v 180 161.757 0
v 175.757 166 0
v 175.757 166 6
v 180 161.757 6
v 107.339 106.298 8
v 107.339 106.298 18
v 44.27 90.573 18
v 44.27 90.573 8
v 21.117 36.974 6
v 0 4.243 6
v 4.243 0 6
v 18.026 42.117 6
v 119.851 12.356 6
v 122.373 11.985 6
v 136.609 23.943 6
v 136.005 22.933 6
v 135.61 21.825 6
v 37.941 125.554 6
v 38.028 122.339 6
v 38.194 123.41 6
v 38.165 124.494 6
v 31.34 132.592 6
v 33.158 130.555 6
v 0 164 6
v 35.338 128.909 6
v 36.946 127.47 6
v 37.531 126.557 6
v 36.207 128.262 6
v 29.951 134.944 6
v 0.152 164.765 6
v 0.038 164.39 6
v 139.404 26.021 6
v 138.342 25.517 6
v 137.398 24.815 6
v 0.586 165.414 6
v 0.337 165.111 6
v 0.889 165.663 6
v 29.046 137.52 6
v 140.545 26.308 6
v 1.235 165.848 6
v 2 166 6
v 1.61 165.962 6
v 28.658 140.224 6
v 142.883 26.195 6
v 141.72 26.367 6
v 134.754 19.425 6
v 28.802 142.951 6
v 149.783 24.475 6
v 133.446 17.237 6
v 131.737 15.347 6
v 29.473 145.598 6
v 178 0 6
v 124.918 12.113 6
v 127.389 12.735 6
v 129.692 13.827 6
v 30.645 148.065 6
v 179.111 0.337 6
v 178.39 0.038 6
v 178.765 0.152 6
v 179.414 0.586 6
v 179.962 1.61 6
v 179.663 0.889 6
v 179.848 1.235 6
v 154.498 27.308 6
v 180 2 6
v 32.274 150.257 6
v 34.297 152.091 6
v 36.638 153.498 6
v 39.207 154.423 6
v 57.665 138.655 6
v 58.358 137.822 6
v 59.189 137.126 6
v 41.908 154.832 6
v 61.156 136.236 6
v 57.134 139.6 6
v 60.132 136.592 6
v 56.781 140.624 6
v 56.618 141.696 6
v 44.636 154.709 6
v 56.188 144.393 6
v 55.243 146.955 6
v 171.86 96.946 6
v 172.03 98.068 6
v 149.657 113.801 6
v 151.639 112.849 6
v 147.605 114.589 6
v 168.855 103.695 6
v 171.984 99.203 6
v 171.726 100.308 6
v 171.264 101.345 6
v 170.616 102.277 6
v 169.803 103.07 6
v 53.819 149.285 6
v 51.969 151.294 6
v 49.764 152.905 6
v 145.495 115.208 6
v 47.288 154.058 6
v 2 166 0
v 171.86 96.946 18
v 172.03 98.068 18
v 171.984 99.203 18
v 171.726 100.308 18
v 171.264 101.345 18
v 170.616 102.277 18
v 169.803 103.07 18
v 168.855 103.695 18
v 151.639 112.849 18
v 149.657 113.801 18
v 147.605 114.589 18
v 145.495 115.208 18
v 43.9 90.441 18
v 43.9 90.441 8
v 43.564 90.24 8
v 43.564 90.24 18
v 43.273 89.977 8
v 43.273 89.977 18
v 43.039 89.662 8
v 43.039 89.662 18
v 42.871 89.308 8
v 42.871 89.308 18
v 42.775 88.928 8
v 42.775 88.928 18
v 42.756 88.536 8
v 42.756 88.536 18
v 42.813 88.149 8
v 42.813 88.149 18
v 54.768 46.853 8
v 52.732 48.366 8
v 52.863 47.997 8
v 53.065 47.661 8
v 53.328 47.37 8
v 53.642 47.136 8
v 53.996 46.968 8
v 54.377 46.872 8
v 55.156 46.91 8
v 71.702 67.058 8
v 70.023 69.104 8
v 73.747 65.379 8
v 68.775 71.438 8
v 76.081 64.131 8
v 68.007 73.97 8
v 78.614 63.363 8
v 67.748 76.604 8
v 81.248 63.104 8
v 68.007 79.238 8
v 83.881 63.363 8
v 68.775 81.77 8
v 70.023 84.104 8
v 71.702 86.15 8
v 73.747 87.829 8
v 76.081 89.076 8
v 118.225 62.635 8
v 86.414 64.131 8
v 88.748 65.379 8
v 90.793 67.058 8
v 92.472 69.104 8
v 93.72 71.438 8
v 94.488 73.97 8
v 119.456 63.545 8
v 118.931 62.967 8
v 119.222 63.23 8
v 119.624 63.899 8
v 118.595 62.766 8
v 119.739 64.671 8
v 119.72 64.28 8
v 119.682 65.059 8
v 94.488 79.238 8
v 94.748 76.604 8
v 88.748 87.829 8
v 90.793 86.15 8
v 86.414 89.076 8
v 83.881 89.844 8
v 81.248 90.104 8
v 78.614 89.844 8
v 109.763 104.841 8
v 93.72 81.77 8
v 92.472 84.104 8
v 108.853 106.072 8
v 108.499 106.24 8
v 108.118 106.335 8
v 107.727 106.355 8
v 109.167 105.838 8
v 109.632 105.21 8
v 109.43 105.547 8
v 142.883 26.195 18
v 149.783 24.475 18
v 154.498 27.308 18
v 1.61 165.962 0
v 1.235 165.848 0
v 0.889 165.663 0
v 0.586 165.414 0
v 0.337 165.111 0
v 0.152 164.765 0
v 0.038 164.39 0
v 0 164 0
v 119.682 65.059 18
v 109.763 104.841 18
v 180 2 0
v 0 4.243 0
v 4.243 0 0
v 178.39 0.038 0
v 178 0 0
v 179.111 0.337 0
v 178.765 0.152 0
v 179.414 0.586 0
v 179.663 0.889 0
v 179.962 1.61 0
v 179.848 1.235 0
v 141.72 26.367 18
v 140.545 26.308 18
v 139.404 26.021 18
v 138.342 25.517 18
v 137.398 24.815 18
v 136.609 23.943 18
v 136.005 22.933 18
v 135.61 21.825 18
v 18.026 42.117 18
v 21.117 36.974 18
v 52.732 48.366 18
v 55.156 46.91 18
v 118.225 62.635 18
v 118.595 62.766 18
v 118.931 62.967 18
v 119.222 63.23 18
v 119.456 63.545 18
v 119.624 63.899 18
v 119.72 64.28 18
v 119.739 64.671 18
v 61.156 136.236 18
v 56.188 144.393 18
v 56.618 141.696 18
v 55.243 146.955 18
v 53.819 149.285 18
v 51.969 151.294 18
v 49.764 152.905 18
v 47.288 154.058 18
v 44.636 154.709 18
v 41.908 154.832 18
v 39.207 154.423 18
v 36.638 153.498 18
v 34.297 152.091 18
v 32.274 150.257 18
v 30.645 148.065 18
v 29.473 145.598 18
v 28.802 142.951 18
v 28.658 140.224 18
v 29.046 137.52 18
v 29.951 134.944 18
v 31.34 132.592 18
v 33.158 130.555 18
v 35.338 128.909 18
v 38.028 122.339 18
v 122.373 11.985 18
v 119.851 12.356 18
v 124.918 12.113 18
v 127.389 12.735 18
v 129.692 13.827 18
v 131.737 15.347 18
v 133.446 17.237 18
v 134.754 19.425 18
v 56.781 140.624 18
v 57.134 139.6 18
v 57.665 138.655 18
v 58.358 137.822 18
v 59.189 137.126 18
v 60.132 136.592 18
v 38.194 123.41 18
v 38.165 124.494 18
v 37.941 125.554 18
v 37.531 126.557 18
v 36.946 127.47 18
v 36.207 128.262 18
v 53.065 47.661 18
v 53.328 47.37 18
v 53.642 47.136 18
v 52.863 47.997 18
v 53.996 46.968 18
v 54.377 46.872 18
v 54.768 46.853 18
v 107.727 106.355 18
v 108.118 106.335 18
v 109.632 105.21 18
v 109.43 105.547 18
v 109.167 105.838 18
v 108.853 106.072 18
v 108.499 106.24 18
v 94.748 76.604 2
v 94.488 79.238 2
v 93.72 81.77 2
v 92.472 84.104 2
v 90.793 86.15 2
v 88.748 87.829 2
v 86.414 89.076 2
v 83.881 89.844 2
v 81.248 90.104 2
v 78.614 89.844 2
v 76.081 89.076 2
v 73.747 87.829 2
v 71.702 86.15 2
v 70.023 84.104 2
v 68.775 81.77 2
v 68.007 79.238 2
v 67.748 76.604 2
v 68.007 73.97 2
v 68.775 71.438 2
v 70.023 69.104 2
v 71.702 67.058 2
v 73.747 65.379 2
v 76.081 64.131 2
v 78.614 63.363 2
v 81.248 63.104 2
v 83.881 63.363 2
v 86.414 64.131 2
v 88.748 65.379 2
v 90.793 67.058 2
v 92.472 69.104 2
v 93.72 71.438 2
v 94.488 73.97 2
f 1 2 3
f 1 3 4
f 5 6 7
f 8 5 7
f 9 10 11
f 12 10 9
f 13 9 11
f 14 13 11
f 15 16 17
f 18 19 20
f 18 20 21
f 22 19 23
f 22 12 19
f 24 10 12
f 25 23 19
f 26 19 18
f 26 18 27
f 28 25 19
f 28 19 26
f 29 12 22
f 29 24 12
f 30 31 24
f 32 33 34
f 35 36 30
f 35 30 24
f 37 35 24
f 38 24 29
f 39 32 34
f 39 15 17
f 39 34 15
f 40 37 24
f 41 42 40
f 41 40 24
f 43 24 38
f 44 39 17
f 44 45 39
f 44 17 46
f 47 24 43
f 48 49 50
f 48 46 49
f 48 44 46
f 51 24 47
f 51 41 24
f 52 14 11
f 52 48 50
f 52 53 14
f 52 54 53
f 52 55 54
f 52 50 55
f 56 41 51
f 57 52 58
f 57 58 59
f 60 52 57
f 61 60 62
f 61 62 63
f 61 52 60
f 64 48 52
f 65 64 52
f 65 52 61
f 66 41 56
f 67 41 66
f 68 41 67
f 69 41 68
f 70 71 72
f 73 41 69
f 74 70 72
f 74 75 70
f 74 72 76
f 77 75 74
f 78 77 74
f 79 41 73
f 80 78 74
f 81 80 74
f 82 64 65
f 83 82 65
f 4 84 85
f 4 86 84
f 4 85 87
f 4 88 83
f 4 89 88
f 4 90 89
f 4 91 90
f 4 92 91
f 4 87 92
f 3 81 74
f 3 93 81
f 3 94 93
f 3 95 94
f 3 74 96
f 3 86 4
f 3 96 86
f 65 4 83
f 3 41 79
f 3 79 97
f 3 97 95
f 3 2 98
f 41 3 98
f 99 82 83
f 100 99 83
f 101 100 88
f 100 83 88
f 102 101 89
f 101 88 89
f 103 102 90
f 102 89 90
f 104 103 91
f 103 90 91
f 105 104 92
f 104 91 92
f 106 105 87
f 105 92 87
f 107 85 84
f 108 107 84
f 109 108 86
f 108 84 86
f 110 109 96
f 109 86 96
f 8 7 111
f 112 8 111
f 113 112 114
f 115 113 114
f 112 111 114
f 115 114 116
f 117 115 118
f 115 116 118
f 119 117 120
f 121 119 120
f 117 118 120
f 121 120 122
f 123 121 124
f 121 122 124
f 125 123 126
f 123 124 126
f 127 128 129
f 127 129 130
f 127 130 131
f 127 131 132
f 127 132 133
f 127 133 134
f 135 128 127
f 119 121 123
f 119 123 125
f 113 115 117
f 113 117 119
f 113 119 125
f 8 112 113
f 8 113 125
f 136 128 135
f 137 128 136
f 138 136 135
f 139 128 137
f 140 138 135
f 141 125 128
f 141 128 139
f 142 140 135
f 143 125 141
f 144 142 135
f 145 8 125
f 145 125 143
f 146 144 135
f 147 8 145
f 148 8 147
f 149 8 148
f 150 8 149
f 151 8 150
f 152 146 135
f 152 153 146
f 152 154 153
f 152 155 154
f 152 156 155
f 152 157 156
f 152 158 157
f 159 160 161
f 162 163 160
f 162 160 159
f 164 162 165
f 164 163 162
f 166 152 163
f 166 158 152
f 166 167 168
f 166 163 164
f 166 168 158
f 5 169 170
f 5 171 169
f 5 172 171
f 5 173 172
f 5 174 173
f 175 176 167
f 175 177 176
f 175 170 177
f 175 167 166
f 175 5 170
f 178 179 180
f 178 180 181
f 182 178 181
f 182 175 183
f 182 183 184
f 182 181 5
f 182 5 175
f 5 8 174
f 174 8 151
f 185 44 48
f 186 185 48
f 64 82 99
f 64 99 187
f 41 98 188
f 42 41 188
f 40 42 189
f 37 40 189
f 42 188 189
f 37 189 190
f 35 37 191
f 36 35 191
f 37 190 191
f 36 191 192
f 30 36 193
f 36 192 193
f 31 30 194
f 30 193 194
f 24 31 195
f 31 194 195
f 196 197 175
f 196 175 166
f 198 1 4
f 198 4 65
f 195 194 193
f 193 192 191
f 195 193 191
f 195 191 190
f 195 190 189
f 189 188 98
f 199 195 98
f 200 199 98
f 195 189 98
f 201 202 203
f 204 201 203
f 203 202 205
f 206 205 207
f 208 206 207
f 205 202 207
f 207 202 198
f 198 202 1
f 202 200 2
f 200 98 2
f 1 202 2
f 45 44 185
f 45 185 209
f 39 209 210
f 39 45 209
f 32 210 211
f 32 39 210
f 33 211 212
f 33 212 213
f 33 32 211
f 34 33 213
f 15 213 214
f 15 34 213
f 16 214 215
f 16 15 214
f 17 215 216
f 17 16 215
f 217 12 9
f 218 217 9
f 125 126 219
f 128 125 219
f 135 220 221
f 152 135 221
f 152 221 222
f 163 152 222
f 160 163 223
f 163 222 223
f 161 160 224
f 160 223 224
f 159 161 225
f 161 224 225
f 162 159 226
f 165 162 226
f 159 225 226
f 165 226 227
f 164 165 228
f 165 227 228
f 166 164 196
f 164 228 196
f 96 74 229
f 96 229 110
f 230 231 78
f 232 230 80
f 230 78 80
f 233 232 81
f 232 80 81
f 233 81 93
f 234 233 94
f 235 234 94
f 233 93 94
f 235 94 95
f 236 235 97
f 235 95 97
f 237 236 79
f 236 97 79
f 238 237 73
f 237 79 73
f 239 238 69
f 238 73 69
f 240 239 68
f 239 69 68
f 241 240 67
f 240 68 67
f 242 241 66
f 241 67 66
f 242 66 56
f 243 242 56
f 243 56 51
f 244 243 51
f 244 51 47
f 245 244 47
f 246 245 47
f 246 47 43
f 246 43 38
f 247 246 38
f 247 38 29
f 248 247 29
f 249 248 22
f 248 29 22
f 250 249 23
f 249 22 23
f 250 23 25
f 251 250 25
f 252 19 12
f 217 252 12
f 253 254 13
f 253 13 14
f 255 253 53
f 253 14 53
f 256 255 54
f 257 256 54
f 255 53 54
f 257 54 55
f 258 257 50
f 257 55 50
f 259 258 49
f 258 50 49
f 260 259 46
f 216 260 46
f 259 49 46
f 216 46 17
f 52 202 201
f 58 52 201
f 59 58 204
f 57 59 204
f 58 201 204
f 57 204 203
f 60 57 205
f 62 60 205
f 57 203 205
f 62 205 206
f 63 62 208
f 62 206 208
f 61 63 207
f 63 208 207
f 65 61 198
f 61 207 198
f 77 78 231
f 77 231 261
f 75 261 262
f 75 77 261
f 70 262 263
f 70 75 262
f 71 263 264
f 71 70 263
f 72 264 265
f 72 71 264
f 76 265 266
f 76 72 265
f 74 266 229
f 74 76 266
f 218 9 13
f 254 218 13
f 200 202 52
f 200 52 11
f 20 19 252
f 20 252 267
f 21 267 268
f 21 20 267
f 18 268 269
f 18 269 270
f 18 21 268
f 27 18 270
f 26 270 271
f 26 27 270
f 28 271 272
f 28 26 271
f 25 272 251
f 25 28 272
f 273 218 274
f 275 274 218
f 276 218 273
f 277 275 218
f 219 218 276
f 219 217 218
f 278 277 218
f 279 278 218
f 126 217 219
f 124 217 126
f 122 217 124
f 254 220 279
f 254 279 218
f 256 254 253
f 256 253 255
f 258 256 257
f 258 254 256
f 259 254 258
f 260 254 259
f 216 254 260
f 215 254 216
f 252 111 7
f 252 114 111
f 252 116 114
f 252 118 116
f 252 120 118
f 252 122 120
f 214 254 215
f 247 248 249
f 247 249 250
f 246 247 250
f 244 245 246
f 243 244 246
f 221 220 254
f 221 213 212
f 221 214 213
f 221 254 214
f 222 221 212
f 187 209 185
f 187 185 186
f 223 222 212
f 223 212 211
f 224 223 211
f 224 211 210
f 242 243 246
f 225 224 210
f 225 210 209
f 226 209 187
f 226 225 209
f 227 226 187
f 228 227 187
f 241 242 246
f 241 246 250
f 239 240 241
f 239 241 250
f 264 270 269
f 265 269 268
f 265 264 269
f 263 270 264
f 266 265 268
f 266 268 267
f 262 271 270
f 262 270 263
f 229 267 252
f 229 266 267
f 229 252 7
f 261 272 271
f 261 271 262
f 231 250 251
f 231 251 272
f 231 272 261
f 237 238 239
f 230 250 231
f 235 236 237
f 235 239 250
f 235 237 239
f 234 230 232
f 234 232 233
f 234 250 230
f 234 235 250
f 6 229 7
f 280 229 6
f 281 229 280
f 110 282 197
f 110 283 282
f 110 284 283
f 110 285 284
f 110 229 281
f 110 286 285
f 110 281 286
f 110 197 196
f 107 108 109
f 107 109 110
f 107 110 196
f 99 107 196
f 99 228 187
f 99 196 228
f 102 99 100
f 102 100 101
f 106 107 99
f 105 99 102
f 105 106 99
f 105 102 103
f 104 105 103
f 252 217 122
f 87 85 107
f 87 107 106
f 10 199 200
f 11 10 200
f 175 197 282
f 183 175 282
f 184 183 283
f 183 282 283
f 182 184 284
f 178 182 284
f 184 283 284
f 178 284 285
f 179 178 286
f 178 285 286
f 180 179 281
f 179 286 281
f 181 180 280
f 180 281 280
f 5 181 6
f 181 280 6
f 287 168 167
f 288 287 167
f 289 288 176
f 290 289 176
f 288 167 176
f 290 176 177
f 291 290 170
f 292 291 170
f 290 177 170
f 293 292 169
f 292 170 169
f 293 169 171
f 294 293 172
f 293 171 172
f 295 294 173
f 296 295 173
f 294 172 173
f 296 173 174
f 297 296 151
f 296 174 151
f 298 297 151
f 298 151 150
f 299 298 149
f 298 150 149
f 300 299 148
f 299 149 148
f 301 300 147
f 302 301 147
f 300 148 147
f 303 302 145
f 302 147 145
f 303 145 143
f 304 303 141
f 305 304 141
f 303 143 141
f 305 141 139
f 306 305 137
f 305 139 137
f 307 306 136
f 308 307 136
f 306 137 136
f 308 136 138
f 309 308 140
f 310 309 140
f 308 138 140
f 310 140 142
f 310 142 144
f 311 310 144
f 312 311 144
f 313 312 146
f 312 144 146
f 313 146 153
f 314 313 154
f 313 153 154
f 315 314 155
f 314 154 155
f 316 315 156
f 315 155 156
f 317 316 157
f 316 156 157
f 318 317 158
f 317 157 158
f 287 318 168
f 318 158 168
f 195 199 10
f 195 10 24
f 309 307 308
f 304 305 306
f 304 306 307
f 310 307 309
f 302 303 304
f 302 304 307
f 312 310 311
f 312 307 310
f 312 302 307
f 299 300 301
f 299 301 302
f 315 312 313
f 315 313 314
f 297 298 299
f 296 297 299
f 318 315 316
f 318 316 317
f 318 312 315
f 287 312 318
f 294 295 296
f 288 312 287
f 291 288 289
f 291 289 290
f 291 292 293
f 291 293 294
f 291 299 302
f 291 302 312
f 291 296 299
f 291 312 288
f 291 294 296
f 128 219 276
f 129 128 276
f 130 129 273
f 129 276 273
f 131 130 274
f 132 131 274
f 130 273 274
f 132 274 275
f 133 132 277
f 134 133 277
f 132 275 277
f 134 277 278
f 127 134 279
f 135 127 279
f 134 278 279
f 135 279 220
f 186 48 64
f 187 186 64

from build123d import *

# Parameters (mm, degrees)
PAD_DEPTH       = 6
PAD001_DEPTH    = 12
POCKET_DEPTH    = 10
SKETCH003_R     = 13.5
POCKET001_DEPTH = 6


with BuildPart() as part:
    # Sketch → Pad (new body)
    with BuildSketch(Plane.XY):
        with BuildLine():
            ThreePointArc((2, 166), (0.585786, 165.414214), (0, 164))
            Line((0, 4.242641), (0, 164))
            Line((0, 4.242641), (4.242641, 0))
            Line((178, 0), (4.242641, 0))
            ThreePointArc((178, 0), (179.414214, 0.585786), (180, 2))
            Line((180, 161.757359), (180, 2))
            Line((175.757359, 166), (180, 161.757359))
            Line((175.757359, 166), (2, 166))
        make_face()
    extrude(amount=PAD_DEPTH)

    # Sketch001 (on Face10 of Pad) → Pad001 (join)
    with BuildSketch(Plane.XY.offset(6)):
        with BuildLine():
            ThreePointArc((56.618237, 141.695686), (35.433188, 152.851689), (35.337576, 128.908975))
            ThreePointArc((38.028145, 122.339284), (37.758773, 126.064762), (35.337576, 128.908975))
            Line((38.028145, 122.339284), (18.026388, 42.116616))
            Line((18.026388, 42.116616), (21.116616, 36.973612))
            Line((21.116616, 36.973612), (119.851347, 12.356279))
            ThreePointArc((119.851347, 12.356279), (129.691827, 13.826948), (135.610177, 21.825139))
            ThreePointArc((142.883482, 26.195382), (138.341722, 25.516611), (135.610177, 21.825139))
            Line((142.883482, 26.195382), (149.78317, 24.475096))
            Line((149.78317, 24.475096), (154.49759, 27.307806))
            Line((171.860307, 96.945859), (154.49759, 27.307806))
            ThreePointArc((171.860307, 96.945859), (171.519805, 100.83781), (168.855362, 103.695076))
            Line((151.638909, 112.849226), (168.855362, 103.695076))
            ThreePointArc((151.638909, 112.849226), (148.639111, 114.216313), (145.495068, 115.207626))
            Line((61.155784, 136.235771), (145.495068, 115.207626))
            ThreePointArc((56.618237, 141.695686), (57.992845, 138.222619), (61.155784, 136.235771))
        make_face()
    extrude(amount=PAD001_DEPTH)

    # Sketch002 (on Face26 of Pad001) → Pocket (cut)
    with BuildSketch(Plane.XY.offset(18)):
        with BuildLine():
            ThreePointArc((44.26968, 90.573005), (43.039189, 89.66249), (42.812933, 88.14857))
            Line((42.812933, 88.14857), (52.73173, 48.366445))
            ThreePointArc((52.73173, 48.366445), (53.642246, 47.135954), (55.156166, 46.909698))
            Line((55.156166, 46.909698), (118.225388, 62.634621))
            ThreePointArc((118.225388, 62.634621), (119.455879, 63.545136), (119.682135, 65.059056))
            Line((109.763338, 104.841181), (119.682135, 65.059056))
            ThreePointArc((109.763338, 104.841181), (108.852822, 106.071672), (107.338902, 106.297928))
            Line((107.338902, 106.297928), (44.26968, 90.573005))
        make_face()
    extrude(amount=-POCKET_DEPTH, mode=Mode.SUBTRACT)

    # Sketch003 (on Face35 of Pocket) → Pocket001 (cut)
    with BuildSketch(Plane.XY.offset(8)):
        with Locations((81.247534, 76.603813)):
            Circle(SKETCH003_R)
    extrude(amount=-POCKET001_DEPTH, mode=Mode.SUBTRACT)


solid = part.part
